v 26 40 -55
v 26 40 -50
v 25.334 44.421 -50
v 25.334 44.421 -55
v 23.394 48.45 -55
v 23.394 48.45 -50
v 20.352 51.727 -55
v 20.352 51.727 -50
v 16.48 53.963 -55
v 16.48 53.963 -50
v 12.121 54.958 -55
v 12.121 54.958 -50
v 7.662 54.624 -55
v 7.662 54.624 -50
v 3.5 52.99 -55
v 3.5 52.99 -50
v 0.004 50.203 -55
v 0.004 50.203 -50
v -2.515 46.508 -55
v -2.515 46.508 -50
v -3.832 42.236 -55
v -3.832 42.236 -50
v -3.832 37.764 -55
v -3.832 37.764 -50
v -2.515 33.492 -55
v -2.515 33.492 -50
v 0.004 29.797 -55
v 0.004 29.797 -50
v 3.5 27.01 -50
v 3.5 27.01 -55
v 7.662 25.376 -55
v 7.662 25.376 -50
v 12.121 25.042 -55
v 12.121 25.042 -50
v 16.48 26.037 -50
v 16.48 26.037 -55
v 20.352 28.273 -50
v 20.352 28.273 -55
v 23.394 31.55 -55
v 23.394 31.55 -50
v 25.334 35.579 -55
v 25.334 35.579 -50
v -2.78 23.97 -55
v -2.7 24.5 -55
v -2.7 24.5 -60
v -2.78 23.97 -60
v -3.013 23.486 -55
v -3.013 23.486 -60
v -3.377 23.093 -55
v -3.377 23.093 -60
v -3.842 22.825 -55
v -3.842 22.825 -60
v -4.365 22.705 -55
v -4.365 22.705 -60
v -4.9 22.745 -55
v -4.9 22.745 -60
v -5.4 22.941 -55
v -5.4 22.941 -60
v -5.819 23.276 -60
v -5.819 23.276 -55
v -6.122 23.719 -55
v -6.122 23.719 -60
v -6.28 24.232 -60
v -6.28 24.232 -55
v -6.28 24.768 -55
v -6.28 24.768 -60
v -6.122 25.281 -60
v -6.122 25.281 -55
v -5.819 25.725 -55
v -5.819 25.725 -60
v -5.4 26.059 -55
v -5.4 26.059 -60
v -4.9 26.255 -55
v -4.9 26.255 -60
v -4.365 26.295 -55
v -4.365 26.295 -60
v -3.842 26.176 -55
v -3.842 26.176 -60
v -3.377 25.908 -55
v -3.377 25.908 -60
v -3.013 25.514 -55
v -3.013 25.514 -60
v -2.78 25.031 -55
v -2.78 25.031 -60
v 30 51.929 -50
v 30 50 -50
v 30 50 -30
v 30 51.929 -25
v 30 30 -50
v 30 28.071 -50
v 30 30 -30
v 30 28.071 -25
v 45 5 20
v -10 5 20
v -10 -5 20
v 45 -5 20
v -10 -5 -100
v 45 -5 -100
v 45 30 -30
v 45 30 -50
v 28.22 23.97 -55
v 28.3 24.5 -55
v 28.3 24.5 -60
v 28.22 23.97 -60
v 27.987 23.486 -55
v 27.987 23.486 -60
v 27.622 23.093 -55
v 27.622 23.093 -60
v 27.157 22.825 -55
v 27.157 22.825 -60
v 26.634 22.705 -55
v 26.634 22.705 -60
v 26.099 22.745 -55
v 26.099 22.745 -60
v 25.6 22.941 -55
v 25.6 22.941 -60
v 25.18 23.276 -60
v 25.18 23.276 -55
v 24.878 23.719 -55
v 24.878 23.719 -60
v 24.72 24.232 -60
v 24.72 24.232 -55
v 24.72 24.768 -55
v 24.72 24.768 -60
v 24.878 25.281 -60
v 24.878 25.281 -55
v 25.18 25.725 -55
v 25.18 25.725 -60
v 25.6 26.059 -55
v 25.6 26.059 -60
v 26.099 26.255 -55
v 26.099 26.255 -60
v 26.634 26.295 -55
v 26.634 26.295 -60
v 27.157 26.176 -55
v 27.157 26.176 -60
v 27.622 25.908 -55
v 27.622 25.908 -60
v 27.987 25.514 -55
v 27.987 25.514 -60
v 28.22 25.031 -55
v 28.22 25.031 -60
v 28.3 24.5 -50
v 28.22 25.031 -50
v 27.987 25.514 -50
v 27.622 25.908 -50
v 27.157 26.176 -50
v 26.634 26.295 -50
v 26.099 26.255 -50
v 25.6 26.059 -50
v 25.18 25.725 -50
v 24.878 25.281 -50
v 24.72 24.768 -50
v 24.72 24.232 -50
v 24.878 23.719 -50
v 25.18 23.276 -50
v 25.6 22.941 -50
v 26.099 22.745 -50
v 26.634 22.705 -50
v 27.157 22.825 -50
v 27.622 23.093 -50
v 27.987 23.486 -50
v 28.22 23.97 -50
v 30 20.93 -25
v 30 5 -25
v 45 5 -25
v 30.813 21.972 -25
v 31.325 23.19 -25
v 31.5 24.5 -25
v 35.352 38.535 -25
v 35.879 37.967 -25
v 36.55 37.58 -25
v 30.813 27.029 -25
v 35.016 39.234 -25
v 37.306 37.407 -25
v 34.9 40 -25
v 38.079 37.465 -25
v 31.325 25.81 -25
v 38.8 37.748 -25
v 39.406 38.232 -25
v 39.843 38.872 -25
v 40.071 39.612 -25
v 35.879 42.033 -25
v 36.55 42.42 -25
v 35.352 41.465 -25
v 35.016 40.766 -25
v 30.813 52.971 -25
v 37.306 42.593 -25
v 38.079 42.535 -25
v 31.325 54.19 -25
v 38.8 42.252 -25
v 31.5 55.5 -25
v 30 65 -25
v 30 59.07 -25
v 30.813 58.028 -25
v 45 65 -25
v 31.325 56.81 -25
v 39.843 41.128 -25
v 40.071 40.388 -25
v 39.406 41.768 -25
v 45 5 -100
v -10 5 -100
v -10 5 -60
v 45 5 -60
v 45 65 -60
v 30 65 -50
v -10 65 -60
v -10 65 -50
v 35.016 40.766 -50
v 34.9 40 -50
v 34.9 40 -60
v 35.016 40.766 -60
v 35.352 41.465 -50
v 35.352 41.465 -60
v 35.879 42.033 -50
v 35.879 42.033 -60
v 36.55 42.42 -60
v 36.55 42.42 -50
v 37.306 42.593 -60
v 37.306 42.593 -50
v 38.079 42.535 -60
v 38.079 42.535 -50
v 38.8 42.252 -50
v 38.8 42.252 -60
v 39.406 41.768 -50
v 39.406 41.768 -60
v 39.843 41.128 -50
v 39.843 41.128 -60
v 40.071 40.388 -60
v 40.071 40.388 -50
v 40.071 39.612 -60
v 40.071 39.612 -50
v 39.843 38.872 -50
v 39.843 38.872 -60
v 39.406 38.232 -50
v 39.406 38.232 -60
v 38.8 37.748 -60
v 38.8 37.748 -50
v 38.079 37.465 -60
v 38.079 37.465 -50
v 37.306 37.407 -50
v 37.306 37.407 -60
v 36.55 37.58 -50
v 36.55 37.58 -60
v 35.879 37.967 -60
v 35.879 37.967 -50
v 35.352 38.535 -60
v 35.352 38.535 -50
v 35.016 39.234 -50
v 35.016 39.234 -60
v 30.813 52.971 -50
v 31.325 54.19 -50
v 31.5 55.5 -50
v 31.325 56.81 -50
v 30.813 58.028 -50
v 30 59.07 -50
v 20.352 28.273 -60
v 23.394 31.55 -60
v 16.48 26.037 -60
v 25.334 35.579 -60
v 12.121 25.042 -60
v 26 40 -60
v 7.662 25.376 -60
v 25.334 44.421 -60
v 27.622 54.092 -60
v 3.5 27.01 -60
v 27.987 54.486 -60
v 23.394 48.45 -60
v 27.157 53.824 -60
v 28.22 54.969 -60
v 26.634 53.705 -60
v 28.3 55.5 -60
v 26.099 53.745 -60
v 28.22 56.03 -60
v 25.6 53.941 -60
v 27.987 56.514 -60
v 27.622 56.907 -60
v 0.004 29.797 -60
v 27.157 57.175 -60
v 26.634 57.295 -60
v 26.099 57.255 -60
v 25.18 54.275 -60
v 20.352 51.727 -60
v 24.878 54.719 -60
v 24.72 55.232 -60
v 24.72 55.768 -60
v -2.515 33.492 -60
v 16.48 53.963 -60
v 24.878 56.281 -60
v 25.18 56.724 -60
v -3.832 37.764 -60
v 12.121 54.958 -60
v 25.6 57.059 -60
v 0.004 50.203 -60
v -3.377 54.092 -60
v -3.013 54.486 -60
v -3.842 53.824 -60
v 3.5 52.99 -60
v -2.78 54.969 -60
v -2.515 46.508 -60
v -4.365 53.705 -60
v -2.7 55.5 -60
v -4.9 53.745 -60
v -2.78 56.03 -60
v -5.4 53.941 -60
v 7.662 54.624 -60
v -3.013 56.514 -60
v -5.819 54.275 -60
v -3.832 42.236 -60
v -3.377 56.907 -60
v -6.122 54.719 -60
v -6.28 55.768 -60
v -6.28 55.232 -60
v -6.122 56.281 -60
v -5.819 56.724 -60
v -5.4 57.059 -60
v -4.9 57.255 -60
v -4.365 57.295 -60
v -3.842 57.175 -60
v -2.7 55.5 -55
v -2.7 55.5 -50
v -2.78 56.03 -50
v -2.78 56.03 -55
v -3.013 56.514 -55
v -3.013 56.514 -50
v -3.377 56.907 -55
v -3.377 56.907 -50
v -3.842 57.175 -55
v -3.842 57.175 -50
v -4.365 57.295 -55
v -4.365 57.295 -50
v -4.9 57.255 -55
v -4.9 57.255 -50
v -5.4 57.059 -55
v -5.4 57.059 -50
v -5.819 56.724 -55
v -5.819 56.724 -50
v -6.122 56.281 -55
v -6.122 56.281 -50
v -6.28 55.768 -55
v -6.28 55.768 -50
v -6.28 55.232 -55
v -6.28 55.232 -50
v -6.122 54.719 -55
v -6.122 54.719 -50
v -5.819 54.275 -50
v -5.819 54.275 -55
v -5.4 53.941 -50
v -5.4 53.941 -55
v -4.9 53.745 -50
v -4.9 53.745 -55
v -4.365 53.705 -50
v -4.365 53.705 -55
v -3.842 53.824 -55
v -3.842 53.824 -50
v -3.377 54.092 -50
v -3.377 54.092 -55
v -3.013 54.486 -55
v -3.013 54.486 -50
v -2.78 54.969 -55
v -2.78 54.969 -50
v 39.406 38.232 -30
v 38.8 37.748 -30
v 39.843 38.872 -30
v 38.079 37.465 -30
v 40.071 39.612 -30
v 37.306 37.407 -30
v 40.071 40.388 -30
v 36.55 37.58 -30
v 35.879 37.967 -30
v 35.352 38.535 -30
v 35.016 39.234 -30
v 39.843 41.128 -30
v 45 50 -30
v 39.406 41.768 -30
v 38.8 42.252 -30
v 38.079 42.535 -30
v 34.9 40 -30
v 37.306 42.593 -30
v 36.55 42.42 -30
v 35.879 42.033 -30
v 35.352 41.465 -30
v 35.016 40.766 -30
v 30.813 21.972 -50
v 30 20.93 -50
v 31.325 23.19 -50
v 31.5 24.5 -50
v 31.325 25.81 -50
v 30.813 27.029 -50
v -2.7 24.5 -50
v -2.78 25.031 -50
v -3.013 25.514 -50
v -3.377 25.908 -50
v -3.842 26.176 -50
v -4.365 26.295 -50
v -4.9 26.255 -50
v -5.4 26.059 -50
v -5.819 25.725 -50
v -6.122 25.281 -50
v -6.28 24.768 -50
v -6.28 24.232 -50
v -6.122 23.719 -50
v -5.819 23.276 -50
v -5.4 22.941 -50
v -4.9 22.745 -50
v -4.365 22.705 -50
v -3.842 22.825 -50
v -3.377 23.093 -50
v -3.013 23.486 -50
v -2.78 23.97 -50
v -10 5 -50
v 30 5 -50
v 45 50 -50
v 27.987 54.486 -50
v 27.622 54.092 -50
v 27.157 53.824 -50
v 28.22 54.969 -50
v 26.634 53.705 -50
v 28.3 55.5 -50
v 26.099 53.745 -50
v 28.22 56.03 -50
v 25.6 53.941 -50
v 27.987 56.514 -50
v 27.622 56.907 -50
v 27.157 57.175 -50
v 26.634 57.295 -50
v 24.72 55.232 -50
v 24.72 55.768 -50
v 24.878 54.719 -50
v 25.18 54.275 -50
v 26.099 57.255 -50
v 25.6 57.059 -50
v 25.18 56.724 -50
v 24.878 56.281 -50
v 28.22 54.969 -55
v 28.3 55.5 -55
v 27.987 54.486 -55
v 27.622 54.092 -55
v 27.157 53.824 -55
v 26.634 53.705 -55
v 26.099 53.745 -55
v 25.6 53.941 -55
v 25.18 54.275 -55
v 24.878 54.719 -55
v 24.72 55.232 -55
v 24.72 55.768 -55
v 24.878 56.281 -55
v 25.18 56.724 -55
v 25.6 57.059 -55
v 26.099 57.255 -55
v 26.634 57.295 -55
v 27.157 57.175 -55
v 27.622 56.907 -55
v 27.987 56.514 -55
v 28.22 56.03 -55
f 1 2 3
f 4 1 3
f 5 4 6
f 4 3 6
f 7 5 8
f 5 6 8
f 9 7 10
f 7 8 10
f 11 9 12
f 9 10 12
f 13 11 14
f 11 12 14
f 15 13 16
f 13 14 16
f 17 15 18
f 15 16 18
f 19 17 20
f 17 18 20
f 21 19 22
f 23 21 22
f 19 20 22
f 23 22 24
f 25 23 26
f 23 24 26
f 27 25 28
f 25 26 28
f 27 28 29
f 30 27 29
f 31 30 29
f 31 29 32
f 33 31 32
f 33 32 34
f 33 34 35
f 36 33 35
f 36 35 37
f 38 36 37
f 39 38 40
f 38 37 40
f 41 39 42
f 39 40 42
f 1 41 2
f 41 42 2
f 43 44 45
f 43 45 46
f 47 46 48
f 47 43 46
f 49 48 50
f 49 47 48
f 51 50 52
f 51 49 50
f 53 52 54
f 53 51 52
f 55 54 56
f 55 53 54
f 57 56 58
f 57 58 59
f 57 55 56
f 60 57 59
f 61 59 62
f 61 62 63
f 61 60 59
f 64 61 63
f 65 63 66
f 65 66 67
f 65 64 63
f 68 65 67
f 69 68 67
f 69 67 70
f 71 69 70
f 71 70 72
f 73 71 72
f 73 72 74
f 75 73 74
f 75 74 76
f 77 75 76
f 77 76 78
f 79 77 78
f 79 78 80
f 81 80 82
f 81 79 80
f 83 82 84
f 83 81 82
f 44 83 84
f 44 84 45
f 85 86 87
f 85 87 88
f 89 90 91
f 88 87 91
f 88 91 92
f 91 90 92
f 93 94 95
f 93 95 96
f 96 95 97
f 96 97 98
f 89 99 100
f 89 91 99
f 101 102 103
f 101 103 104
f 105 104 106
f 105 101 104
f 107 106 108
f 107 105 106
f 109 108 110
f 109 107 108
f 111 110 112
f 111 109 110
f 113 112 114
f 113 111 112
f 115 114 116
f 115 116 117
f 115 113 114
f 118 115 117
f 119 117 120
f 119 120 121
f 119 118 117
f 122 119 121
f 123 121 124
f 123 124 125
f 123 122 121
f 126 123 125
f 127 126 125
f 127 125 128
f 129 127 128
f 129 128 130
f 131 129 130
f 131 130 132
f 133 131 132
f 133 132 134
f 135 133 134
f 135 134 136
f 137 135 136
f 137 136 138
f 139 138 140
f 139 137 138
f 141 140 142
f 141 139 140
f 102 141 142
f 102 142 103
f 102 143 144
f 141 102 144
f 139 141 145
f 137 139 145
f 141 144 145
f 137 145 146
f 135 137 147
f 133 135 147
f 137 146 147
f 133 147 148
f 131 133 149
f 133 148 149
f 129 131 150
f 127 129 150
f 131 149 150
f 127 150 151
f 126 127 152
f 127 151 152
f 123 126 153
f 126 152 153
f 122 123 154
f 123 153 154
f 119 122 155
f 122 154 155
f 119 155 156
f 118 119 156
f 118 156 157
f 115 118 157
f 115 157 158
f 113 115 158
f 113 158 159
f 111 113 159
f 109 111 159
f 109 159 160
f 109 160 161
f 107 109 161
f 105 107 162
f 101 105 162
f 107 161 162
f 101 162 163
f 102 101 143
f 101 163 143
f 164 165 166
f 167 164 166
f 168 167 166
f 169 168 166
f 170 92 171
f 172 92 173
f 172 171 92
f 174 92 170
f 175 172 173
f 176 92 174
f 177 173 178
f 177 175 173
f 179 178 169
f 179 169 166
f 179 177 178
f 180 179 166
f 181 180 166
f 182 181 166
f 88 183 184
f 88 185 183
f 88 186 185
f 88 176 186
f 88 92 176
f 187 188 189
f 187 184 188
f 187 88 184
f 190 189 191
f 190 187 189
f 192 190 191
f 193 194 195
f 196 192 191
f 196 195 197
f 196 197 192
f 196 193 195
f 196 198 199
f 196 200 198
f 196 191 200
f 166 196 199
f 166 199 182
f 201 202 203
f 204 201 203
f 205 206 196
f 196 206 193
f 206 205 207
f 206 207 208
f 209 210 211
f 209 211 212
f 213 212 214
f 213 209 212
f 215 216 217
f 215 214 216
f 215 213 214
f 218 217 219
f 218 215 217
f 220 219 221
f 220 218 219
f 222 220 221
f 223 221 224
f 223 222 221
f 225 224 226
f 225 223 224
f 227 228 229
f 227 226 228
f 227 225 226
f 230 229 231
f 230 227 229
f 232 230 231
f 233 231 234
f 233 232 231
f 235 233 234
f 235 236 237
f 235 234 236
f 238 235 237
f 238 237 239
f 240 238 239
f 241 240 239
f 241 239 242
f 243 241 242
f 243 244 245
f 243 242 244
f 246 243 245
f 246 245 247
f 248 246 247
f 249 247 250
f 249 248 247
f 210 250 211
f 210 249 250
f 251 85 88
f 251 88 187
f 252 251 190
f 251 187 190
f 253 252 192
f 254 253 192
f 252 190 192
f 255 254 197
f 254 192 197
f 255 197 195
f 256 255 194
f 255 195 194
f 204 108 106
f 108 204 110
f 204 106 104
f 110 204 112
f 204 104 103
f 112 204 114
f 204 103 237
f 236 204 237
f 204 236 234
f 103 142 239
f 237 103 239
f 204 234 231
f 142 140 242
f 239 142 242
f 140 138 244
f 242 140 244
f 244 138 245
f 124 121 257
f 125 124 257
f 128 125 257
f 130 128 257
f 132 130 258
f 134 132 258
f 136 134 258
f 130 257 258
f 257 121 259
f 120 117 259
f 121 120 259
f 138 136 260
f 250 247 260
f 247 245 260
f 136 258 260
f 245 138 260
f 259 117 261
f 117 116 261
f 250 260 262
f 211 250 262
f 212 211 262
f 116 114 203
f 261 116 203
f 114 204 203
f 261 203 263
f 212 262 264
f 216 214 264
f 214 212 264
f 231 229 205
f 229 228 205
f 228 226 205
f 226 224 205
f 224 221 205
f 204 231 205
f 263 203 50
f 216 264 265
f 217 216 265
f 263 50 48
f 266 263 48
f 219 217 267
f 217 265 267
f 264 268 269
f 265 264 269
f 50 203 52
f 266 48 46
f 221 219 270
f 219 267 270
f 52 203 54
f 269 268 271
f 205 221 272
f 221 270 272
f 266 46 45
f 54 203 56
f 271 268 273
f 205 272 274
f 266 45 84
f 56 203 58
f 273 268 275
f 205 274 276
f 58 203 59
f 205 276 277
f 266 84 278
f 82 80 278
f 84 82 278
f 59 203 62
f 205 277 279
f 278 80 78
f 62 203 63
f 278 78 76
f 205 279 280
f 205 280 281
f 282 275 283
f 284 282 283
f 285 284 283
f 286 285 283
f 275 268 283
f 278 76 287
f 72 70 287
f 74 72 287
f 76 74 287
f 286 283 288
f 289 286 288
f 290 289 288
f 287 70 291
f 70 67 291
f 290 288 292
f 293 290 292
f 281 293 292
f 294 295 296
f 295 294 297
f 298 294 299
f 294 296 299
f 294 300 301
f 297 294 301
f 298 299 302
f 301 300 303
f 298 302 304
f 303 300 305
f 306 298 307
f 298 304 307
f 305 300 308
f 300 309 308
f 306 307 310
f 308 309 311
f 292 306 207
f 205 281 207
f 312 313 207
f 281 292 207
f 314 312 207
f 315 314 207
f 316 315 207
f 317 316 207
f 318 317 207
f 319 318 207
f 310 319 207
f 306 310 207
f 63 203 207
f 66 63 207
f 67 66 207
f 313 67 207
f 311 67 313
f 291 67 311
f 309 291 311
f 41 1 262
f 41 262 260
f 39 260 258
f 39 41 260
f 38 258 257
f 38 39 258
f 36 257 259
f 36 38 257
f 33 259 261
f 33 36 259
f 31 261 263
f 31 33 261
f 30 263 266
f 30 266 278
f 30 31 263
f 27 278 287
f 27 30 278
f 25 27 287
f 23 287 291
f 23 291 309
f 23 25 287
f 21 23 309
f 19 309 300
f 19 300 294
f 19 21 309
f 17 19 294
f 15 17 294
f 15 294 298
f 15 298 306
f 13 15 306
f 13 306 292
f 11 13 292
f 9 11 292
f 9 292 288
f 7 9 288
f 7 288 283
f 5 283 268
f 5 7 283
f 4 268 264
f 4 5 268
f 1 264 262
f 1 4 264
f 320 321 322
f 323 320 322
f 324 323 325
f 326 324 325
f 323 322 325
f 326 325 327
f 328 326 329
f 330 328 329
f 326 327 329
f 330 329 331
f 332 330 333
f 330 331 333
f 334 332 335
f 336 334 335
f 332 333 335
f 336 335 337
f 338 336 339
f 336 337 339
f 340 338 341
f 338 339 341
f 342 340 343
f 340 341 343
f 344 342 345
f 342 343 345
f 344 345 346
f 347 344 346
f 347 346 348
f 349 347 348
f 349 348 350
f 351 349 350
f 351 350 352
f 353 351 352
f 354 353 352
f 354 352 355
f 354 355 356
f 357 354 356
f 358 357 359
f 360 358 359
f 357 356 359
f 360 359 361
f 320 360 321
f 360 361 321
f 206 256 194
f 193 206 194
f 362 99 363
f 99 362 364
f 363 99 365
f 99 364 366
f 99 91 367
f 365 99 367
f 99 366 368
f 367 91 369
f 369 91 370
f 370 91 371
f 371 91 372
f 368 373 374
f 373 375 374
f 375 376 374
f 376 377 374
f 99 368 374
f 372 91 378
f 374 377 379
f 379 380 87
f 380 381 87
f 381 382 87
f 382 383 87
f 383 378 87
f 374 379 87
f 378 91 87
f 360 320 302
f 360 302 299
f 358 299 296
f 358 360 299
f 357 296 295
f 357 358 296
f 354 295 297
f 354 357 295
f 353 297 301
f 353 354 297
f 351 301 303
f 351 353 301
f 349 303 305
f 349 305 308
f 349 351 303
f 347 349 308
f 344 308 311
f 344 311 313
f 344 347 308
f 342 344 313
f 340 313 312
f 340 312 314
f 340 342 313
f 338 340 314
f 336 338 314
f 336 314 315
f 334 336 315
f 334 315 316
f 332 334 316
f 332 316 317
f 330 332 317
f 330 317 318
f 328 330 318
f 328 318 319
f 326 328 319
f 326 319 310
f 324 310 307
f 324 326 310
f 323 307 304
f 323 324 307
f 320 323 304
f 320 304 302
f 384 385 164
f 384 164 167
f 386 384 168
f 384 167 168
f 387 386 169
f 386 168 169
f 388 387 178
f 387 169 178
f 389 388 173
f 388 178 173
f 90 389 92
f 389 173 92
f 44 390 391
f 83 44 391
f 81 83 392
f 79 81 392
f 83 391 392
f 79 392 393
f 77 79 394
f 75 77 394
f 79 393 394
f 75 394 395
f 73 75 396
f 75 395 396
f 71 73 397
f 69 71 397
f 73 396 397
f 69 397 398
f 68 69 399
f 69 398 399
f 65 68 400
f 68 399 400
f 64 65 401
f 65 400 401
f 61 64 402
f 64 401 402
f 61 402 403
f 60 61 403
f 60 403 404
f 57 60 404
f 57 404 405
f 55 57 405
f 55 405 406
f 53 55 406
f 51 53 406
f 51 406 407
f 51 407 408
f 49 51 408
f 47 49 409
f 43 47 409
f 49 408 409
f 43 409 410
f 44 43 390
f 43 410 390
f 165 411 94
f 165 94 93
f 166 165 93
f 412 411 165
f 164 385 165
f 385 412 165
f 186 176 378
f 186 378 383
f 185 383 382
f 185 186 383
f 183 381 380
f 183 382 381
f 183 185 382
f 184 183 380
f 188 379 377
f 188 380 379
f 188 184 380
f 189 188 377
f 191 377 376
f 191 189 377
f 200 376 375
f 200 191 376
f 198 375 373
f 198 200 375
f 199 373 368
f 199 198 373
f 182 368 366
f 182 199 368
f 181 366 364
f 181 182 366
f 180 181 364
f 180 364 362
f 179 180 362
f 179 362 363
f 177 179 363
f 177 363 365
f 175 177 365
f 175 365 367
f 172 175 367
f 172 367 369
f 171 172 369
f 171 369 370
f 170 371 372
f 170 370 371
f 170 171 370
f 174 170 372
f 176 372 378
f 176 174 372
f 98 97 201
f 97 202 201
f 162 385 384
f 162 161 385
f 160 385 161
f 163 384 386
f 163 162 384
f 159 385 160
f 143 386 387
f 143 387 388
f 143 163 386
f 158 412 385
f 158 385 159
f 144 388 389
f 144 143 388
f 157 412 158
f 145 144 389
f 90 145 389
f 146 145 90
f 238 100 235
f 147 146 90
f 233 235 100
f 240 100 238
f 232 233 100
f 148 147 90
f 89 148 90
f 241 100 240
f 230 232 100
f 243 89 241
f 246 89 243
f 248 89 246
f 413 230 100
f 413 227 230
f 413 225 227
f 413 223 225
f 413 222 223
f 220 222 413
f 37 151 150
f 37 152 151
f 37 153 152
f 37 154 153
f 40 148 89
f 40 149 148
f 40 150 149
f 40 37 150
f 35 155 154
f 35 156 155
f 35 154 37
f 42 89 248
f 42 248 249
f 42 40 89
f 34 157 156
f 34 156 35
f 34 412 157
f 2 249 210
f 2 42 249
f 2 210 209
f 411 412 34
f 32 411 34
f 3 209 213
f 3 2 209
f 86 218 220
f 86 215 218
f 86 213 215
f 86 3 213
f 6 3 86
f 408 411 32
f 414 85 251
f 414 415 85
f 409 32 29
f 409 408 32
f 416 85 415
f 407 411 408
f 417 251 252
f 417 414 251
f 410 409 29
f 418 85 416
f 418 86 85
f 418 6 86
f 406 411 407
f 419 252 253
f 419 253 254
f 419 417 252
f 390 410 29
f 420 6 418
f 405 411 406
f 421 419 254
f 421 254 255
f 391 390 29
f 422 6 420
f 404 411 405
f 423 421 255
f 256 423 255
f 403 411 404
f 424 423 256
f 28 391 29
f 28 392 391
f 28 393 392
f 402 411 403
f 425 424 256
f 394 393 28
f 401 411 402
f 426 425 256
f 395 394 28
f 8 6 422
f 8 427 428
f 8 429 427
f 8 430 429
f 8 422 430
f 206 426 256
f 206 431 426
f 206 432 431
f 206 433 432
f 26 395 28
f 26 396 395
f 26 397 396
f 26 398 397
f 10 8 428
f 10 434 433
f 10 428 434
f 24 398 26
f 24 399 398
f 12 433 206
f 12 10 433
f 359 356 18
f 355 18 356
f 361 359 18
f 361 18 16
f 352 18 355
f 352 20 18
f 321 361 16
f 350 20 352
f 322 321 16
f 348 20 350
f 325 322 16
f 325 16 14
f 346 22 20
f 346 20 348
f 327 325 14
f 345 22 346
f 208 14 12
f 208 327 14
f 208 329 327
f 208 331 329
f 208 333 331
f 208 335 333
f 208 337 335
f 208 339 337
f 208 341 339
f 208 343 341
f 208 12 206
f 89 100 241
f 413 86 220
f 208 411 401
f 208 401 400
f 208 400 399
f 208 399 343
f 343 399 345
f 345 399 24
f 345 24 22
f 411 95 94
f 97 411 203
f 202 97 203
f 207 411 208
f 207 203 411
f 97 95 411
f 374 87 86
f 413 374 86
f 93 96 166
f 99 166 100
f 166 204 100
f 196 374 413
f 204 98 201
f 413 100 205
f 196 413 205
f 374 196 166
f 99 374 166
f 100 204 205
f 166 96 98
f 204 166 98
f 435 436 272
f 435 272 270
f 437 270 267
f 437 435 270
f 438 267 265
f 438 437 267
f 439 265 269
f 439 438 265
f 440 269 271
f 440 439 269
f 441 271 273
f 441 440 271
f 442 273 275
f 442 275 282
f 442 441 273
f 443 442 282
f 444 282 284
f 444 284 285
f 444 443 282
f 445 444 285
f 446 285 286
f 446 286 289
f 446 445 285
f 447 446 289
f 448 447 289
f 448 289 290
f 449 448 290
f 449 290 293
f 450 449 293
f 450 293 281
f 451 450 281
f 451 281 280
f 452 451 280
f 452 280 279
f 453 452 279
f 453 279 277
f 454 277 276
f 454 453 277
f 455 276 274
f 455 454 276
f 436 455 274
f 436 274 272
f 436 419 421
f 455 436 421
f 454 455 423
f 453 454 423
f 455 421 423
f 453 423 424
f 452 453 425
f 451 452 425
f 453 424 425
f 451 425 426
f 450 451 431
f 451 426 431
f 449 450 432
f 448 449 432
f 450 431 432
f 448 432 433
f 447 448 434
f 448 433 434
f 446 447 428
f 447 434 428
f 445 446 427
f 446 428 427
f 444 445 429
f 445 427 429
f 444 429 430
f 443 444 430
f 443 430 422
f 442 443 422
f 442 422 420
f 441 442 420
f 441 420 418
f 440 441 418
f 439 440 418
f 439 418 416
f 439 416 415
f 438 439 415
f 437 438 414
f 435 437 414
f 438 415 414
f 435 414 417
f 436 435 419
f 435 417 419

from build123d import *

# Parameters (mm, degrees)
SKETCH4_W               = 40
SKETCH4_H               = 80
BOSS_EXTRUDE4_DEPTH     = 5
SKETCH5_W               = 10
SKETCH5_H               = 5
BOSS_EXTRUDE6_DEPTH     = 50
SKETCH7_W               = 10
SKETCH7_H               = 25
SKETCH7_H_2             = 5
BOSS_EXTRUDE7_DEPTH     = 20
SKETCH8_W               = 40
SKETCH8_H               = 5
BOSS_EXTRUDE8_DEPTH     = 20
SKETCH9_W               = 100
SKETCH9_H               = 5
BOSS_EXTRUDE9_DEPTH     = 10
SKETCH10_W              = 5
SKETCH10_H              = 50
BOSS_EXTRUDE10_DEPTH    = 40
BOSS_EXTRUDE11_DEPTH    = 10
SKETCH12_R              = 15
SKETCH12_R_2            = 1.8
CUT_EXTRUDE1_DEPTH      = 5
CUT_EXTRUDE2_DEPTH      = 92.241437954
CUT_EXTRUDE2_DEPTH_BACK = 92.241437954
SKETCH13_R              = 2.25
SKETCH14_R              = 4
SKETCH14_R_2            = 2.25
CUT_EXTRUDE4_DEPTH      = 2
CUT_EXTRUDE5_START      = -2
SKETCH15_R              = 4
SKETCH15_R_2            = 2.25
CUT_EXTRUDE5_DEPTH      = 2
SKETCH17_R              = 5
CUT_EXTRUDE6_DEPTH      = 25
SKETCH19_W              = 50
SKETCH19_H              = 60
SKETCH19_R              = 1.8
SKETCH19_R_2            = 15
SKETCH19_R_3            = 4
BOSS_EXTRUDE13_DEPTH    = 5
SKETCH20_R              = 4
SKETCH20_R_2            = 2.25
BOSS_EXTRUDE14_DEPTH    = 5
SKETCH21_W              = 20
SKETCH21_H              = 20
BOSS_EXTRUDE15_DEPTH    = 5
BOSS_EXTRUDE16_START    = -10
SKETCH22_R              = 4
BOSS_EXTRUDE16_DEPTH    = 10
SKETCH23_R              = 4
BOSS_EXTRUDE17_DEPTH    = 5
CUT_EXTRUDE7_DEPTH      = 106.59356041
CUT_EXTRUDE7_DEPTH_BACK = 106.59356041
SKETCH24_R              = 2.6
SKETCH25_W              = 55
SKETCH25_H              = 100
BOSS_EXTRUDE18_DEPTH    = 5
SKETCH26_W              = 55
SKETCH26_H              = 10
BOSS_EXTRUDE19_DEPTH    = 20


with BuildPart() as part:
    # Sketch4 → Boss-Extrude4 (new body)
    with BuildSketch(Plane(origin=(0, 0, 0), x_dir=(1, 0, 0), z_dir=(0, 1, 0))):
        with Locations((20, 40)):
            Rectangle(SKETCH4_W, SKETCH4_H)
    extrude(amount=BOSS_EXTRUDE4_DEPTH)

    # Sketch5 → Boss-Extrude6 (add)
    with BuildSketch(Plane(origin=(0, 5, 0), x_dir=(1, 0, 0), z_dir=(0, 1, 0))):
        with Locations((35, 52.5)):
            Rectangle(SKETCH5_W, SKETCH5_H)
        with Locations((35, 27.5)):
            Rectangle(SKETCH5_W, SKETCH5_H)
    extrude(amount=BOSS_EXTRUDE6_DEPTH)

    # Sketch7 → Boss-Extrude7 (add)
    with BuildSketch(Plane.XY.offset(-50)):
        with Locations((35, 17.5)):
            Rectangle(SKETCH7_W, SKETCH7_H)
        with Locations((35, 52.5)):
            Rectangle(SKETCH7_W, SKETCH7_H_2)
    extrude(amount=BOSS_EXTRUDE7_DEPTH)

    # Sketch8 → Boss-Extrude8 (add)
    with BuildSketch(Plane(origin=(0, 0, -80), x_dir=(-1, 0, 0), z_dir=(0, 0, -1))):
        with Locations((-20, 2.5)):
            Rectangle(SKETCH8_W, SKETCH8_H)
    extrude(amount=BOSS_EXTRUDE8_DEPTH)

    # Sketch9 → Boss-Extrude9 (add)
    with BuildSketch(Plane.ZY):
        with Locations((-50, 2.5)):
            Rectangle(SKETCH9_W, SKETCH9_H)
    extrude(amount=BOSS_EXTRUDE9_DEPTH)

    # Sketch10 → Boss-Extrude10 (add)
    with BuildSketch(Plane.ZY.offset(-30)):
        with Locations((-52.5, 30)):
            Rectangle(SKETCH10_W, SKETCH10_H)
    extrude(amount=BOSS_EXTRUDE10_DEPTH)

    # Sketch11 → Boss-Extrude11 (add)
    with BuildSketch(Plane(origin=(0, 55, 0), x_dir=(1, 0, 0), z_dir=(0, 1, 0))):
        Polygon((40, 55), (-10, 55), (-10, 50), (30, 50), (30, 25), (40, 25), align=None)
    extrude(amount=BOSS_EXTRUDE11_DEPTH)

    # Sketch12 → Cut-Extrude1 (cut)
    with BuildSketch(Plane.XY.offset(-50)):
        with Locations((11, 40)):
            Circle(SKETCH12_R)
        with Locations((-4.499780644, 55.499780644)):
            Circle(SKETCH12_R_2)
        with Locations((26.499780644, 55.499780644)):
            Circle(SKETCH12_R_2)
        with Locations((-4.499780644, 24.500219356)):
            Circle(SKETCH12_R_2)
        with Locations((26.499780644, 24.500219356)):
            Circle(SKETCH12_R_2)
    extrude(amount=-CUT_EXTRUDE1_DEPTH, mode=Mode.SUBTRACT)

    # Sketch13 → Cut-Extrude2 (cut, two sides: drawn at the far end of the back side and taken through both)
    with BuildSketch(Plane.XY.offset(-50).offset(-CUT_EXTRUDE2_DEPTH_BACK)):
        with Locations((35, 40)):
            Circle(SKETCH13_R)
    extrude(amount=CUT_EXTRUDE2_DEPTH + CUT_EXTRUDE2_DEPTH_BACK, mode=Mode.SUBTRACT)

    # Sketch14 → Cut-Extrude4 (cut)
    with BuildSketch(Plane.XY.offset(-25)):
        with Locations((35, 40)):
            Circle(SKETCH14_R)
        with Locations((35, 40)):
            Circle(SKETCH14_R_2, mode=Mode.SUBTRACT)
    extrude(amount=-CUT_EXTRUDE4_DEPTH, mode=Mode.SUBTRACT)

    # Sketch15 → Cut-Extrude5 (cut)
    with BuildSketch(Plane(origin=(0, 0, -55), x_dir=(-1, 0, 0), z_dir=(0, 0, -1)).offset(CUT_EXTRUDE5_START)):
        with Locations(Location((-35, 40, 0), (0, 0, 180))):
            Circle(SKETCH15_R)
        with Locations(Location((-35, 40, 0), (0, 0, 180))):
            Circle(SKETCH15_R_2, mode=Mode.SUBTRACT)
    extrude(amount=CUT_EXTRUDE5_DEPTH, mode=Mode.SUBTRACT)

    # Sketch17 → Cut-Extrude6 (cut)
    with BuildSketch(Plane.XY.offset(-25)):
        with Locations((26.499780644, 55.499780644)):
            Circle(SKETCH17_R)
        with Locations((26.499780644, 24.500219356)):
            Circle(SKETCH17_R)
    extrude(amount=-CUT_EXTRUDE6_DEPTH, mode=Mode.SUBTRACT)

    # Sketch19 → Boss-Extrude13 (add)
    with BuildSketch(Plane(origin=(0, 0, -55), x_dir=(-1, 0, 0), z_dir=(0, 0, -1))):
        with Locations((-15, 35)):
            Rectangle(SKETCH19_W, SKETCH19_H)
        with Locations(Location((4.499780644, 55.499780644, 0), (0, 0, 180))):
            Circle(SKETCH19_R, mode=Mode.SUBTRACT)
        with Locations(Location((4.499780644, 24.500219356, 0), (0, 0, 180))):
            Circle(SKETCH19_R, mode=Mode.SUBTRACT)
        with Locations(Location((-26.499780644, 24.500219356, 0), (0, 0, 180))):
            Circle(SKETCH19_R, mode=Mode.SUBTRACT)
        with Locations(Location((-11, 40, 0), (0, 0, 180))):
            Circle(SKETCH19_R_2, mode=Mode.SUBTRACT)
        with Locations(Location((-35, 40, 0), (0, 0, 180))):
            Circle(SKETCH19_R_3, mode=Mode.SUBTRACT)
        with Locations(Location((-26.499780644, 55.499780644, 0), (0, 0, 180))):
            Circle(SKETCH19_R, mode=Mode.SUBTRACT)
    extrude(amount=BOSS_EXTRUDE13_DEPTH)

    # Sketch20 → Boss-Extrude14 (add)
    with BuildSketch(Plane(origin=(0, 0, -53), x_dir=(-1, 0, 0), z_dir=(0, 0, -1))):
        with Locations(Location((-35, 40, 0), (0, 0, 180))):
            Circle(SKETCH20_R)
        with Locations(Location((-35, 40, 0), (0, 0, 180))):
            Circle(SKETCH20_R_2, mode=Mode.SUBTRACT)
    extrude(amount=BOSS_EXTRUDE14_DEPTH)

    # Sketch21 → Boss-Extrude15 (add)
    with BuildSketch(Plane(origin=(40, 0, 0), x_dir=(0, 0, -1), z_dir=(1, 0, 0))):
        Polygon((100, 5), (60, 5), (60, 65), (25, 65), (25, 5), (0, 5), (0, 0), (100, 0), align=None)
        with Locations((40, 40)):
            Rectangle(SKETCH21_W, SKETCH21_H, mode=Mode.SUBTRACT)
    extrude(amount=BOSS_EXTRUDE15_DEPTH)

    # Sketch22 → Boss-Extrude16 (add)
    with BuildSketch(Plane(origin=(0, 0, -60), x_dir=(-1, 0, 0), z_dir=(0, 0, -1)).offset(BOSS_EXTRUDE16_START)):
        with Locations(Location((-35, 40, 0), (0, 0, 180))):
            Circle(SKETCH22_R)
    extrude(amount=BOSS_EXTRUDE16_DEPTH)

    # Sketch23 → Boss-Extrude17 (add)
    with BuildSketch(Plane.XY.offset(-25)):
        with Locations((35, 40)):
            Circle(SKETCH23_R)
    extrude(amount=-BOSS_EXTRUDE17_DEPTH)

    # Sketch24 → Cut-Extrude7 (cut, two sides: drawn at the far end of the back side and taken through both)
    with BuildSketch(Plane(origin=(0, 0, -30), x_dir=(-1, 0, 0), z_dir=(0, 0, -1)).offset(-CUT_EXTRUDE7_DEPTH_BACK)):
        with Locations((-37.5, 40)):
            Circle(SKETCH24_R)
    extrude(amount=CUT_EXTRUDE7_DEPTH + CUT_EXTRUDE7_DEPTH_BACK, mode=Mode.SUBTRACT)

    # Sketch25 → Boss-Extrude18 (add)
    with BuildSketch(Plane.XZ):
        with Locations((17.5, -50)):
            Rectangle(SKETCH25_W, SKETCH25_H)
    extrude(amount=BOSS_EXTRUDE18_DEPTH)

    # Sketch26 → Boss-Extrude19 (add)
    with BuildSketch(Plane.XY):
        with Locations((17.5, 0)):
            Rectangle(SKETCH26_W, SKETCH26_H)
    extrude(amount=BOSS_EXTRUDE19_DEPTH)


solid = part.part
